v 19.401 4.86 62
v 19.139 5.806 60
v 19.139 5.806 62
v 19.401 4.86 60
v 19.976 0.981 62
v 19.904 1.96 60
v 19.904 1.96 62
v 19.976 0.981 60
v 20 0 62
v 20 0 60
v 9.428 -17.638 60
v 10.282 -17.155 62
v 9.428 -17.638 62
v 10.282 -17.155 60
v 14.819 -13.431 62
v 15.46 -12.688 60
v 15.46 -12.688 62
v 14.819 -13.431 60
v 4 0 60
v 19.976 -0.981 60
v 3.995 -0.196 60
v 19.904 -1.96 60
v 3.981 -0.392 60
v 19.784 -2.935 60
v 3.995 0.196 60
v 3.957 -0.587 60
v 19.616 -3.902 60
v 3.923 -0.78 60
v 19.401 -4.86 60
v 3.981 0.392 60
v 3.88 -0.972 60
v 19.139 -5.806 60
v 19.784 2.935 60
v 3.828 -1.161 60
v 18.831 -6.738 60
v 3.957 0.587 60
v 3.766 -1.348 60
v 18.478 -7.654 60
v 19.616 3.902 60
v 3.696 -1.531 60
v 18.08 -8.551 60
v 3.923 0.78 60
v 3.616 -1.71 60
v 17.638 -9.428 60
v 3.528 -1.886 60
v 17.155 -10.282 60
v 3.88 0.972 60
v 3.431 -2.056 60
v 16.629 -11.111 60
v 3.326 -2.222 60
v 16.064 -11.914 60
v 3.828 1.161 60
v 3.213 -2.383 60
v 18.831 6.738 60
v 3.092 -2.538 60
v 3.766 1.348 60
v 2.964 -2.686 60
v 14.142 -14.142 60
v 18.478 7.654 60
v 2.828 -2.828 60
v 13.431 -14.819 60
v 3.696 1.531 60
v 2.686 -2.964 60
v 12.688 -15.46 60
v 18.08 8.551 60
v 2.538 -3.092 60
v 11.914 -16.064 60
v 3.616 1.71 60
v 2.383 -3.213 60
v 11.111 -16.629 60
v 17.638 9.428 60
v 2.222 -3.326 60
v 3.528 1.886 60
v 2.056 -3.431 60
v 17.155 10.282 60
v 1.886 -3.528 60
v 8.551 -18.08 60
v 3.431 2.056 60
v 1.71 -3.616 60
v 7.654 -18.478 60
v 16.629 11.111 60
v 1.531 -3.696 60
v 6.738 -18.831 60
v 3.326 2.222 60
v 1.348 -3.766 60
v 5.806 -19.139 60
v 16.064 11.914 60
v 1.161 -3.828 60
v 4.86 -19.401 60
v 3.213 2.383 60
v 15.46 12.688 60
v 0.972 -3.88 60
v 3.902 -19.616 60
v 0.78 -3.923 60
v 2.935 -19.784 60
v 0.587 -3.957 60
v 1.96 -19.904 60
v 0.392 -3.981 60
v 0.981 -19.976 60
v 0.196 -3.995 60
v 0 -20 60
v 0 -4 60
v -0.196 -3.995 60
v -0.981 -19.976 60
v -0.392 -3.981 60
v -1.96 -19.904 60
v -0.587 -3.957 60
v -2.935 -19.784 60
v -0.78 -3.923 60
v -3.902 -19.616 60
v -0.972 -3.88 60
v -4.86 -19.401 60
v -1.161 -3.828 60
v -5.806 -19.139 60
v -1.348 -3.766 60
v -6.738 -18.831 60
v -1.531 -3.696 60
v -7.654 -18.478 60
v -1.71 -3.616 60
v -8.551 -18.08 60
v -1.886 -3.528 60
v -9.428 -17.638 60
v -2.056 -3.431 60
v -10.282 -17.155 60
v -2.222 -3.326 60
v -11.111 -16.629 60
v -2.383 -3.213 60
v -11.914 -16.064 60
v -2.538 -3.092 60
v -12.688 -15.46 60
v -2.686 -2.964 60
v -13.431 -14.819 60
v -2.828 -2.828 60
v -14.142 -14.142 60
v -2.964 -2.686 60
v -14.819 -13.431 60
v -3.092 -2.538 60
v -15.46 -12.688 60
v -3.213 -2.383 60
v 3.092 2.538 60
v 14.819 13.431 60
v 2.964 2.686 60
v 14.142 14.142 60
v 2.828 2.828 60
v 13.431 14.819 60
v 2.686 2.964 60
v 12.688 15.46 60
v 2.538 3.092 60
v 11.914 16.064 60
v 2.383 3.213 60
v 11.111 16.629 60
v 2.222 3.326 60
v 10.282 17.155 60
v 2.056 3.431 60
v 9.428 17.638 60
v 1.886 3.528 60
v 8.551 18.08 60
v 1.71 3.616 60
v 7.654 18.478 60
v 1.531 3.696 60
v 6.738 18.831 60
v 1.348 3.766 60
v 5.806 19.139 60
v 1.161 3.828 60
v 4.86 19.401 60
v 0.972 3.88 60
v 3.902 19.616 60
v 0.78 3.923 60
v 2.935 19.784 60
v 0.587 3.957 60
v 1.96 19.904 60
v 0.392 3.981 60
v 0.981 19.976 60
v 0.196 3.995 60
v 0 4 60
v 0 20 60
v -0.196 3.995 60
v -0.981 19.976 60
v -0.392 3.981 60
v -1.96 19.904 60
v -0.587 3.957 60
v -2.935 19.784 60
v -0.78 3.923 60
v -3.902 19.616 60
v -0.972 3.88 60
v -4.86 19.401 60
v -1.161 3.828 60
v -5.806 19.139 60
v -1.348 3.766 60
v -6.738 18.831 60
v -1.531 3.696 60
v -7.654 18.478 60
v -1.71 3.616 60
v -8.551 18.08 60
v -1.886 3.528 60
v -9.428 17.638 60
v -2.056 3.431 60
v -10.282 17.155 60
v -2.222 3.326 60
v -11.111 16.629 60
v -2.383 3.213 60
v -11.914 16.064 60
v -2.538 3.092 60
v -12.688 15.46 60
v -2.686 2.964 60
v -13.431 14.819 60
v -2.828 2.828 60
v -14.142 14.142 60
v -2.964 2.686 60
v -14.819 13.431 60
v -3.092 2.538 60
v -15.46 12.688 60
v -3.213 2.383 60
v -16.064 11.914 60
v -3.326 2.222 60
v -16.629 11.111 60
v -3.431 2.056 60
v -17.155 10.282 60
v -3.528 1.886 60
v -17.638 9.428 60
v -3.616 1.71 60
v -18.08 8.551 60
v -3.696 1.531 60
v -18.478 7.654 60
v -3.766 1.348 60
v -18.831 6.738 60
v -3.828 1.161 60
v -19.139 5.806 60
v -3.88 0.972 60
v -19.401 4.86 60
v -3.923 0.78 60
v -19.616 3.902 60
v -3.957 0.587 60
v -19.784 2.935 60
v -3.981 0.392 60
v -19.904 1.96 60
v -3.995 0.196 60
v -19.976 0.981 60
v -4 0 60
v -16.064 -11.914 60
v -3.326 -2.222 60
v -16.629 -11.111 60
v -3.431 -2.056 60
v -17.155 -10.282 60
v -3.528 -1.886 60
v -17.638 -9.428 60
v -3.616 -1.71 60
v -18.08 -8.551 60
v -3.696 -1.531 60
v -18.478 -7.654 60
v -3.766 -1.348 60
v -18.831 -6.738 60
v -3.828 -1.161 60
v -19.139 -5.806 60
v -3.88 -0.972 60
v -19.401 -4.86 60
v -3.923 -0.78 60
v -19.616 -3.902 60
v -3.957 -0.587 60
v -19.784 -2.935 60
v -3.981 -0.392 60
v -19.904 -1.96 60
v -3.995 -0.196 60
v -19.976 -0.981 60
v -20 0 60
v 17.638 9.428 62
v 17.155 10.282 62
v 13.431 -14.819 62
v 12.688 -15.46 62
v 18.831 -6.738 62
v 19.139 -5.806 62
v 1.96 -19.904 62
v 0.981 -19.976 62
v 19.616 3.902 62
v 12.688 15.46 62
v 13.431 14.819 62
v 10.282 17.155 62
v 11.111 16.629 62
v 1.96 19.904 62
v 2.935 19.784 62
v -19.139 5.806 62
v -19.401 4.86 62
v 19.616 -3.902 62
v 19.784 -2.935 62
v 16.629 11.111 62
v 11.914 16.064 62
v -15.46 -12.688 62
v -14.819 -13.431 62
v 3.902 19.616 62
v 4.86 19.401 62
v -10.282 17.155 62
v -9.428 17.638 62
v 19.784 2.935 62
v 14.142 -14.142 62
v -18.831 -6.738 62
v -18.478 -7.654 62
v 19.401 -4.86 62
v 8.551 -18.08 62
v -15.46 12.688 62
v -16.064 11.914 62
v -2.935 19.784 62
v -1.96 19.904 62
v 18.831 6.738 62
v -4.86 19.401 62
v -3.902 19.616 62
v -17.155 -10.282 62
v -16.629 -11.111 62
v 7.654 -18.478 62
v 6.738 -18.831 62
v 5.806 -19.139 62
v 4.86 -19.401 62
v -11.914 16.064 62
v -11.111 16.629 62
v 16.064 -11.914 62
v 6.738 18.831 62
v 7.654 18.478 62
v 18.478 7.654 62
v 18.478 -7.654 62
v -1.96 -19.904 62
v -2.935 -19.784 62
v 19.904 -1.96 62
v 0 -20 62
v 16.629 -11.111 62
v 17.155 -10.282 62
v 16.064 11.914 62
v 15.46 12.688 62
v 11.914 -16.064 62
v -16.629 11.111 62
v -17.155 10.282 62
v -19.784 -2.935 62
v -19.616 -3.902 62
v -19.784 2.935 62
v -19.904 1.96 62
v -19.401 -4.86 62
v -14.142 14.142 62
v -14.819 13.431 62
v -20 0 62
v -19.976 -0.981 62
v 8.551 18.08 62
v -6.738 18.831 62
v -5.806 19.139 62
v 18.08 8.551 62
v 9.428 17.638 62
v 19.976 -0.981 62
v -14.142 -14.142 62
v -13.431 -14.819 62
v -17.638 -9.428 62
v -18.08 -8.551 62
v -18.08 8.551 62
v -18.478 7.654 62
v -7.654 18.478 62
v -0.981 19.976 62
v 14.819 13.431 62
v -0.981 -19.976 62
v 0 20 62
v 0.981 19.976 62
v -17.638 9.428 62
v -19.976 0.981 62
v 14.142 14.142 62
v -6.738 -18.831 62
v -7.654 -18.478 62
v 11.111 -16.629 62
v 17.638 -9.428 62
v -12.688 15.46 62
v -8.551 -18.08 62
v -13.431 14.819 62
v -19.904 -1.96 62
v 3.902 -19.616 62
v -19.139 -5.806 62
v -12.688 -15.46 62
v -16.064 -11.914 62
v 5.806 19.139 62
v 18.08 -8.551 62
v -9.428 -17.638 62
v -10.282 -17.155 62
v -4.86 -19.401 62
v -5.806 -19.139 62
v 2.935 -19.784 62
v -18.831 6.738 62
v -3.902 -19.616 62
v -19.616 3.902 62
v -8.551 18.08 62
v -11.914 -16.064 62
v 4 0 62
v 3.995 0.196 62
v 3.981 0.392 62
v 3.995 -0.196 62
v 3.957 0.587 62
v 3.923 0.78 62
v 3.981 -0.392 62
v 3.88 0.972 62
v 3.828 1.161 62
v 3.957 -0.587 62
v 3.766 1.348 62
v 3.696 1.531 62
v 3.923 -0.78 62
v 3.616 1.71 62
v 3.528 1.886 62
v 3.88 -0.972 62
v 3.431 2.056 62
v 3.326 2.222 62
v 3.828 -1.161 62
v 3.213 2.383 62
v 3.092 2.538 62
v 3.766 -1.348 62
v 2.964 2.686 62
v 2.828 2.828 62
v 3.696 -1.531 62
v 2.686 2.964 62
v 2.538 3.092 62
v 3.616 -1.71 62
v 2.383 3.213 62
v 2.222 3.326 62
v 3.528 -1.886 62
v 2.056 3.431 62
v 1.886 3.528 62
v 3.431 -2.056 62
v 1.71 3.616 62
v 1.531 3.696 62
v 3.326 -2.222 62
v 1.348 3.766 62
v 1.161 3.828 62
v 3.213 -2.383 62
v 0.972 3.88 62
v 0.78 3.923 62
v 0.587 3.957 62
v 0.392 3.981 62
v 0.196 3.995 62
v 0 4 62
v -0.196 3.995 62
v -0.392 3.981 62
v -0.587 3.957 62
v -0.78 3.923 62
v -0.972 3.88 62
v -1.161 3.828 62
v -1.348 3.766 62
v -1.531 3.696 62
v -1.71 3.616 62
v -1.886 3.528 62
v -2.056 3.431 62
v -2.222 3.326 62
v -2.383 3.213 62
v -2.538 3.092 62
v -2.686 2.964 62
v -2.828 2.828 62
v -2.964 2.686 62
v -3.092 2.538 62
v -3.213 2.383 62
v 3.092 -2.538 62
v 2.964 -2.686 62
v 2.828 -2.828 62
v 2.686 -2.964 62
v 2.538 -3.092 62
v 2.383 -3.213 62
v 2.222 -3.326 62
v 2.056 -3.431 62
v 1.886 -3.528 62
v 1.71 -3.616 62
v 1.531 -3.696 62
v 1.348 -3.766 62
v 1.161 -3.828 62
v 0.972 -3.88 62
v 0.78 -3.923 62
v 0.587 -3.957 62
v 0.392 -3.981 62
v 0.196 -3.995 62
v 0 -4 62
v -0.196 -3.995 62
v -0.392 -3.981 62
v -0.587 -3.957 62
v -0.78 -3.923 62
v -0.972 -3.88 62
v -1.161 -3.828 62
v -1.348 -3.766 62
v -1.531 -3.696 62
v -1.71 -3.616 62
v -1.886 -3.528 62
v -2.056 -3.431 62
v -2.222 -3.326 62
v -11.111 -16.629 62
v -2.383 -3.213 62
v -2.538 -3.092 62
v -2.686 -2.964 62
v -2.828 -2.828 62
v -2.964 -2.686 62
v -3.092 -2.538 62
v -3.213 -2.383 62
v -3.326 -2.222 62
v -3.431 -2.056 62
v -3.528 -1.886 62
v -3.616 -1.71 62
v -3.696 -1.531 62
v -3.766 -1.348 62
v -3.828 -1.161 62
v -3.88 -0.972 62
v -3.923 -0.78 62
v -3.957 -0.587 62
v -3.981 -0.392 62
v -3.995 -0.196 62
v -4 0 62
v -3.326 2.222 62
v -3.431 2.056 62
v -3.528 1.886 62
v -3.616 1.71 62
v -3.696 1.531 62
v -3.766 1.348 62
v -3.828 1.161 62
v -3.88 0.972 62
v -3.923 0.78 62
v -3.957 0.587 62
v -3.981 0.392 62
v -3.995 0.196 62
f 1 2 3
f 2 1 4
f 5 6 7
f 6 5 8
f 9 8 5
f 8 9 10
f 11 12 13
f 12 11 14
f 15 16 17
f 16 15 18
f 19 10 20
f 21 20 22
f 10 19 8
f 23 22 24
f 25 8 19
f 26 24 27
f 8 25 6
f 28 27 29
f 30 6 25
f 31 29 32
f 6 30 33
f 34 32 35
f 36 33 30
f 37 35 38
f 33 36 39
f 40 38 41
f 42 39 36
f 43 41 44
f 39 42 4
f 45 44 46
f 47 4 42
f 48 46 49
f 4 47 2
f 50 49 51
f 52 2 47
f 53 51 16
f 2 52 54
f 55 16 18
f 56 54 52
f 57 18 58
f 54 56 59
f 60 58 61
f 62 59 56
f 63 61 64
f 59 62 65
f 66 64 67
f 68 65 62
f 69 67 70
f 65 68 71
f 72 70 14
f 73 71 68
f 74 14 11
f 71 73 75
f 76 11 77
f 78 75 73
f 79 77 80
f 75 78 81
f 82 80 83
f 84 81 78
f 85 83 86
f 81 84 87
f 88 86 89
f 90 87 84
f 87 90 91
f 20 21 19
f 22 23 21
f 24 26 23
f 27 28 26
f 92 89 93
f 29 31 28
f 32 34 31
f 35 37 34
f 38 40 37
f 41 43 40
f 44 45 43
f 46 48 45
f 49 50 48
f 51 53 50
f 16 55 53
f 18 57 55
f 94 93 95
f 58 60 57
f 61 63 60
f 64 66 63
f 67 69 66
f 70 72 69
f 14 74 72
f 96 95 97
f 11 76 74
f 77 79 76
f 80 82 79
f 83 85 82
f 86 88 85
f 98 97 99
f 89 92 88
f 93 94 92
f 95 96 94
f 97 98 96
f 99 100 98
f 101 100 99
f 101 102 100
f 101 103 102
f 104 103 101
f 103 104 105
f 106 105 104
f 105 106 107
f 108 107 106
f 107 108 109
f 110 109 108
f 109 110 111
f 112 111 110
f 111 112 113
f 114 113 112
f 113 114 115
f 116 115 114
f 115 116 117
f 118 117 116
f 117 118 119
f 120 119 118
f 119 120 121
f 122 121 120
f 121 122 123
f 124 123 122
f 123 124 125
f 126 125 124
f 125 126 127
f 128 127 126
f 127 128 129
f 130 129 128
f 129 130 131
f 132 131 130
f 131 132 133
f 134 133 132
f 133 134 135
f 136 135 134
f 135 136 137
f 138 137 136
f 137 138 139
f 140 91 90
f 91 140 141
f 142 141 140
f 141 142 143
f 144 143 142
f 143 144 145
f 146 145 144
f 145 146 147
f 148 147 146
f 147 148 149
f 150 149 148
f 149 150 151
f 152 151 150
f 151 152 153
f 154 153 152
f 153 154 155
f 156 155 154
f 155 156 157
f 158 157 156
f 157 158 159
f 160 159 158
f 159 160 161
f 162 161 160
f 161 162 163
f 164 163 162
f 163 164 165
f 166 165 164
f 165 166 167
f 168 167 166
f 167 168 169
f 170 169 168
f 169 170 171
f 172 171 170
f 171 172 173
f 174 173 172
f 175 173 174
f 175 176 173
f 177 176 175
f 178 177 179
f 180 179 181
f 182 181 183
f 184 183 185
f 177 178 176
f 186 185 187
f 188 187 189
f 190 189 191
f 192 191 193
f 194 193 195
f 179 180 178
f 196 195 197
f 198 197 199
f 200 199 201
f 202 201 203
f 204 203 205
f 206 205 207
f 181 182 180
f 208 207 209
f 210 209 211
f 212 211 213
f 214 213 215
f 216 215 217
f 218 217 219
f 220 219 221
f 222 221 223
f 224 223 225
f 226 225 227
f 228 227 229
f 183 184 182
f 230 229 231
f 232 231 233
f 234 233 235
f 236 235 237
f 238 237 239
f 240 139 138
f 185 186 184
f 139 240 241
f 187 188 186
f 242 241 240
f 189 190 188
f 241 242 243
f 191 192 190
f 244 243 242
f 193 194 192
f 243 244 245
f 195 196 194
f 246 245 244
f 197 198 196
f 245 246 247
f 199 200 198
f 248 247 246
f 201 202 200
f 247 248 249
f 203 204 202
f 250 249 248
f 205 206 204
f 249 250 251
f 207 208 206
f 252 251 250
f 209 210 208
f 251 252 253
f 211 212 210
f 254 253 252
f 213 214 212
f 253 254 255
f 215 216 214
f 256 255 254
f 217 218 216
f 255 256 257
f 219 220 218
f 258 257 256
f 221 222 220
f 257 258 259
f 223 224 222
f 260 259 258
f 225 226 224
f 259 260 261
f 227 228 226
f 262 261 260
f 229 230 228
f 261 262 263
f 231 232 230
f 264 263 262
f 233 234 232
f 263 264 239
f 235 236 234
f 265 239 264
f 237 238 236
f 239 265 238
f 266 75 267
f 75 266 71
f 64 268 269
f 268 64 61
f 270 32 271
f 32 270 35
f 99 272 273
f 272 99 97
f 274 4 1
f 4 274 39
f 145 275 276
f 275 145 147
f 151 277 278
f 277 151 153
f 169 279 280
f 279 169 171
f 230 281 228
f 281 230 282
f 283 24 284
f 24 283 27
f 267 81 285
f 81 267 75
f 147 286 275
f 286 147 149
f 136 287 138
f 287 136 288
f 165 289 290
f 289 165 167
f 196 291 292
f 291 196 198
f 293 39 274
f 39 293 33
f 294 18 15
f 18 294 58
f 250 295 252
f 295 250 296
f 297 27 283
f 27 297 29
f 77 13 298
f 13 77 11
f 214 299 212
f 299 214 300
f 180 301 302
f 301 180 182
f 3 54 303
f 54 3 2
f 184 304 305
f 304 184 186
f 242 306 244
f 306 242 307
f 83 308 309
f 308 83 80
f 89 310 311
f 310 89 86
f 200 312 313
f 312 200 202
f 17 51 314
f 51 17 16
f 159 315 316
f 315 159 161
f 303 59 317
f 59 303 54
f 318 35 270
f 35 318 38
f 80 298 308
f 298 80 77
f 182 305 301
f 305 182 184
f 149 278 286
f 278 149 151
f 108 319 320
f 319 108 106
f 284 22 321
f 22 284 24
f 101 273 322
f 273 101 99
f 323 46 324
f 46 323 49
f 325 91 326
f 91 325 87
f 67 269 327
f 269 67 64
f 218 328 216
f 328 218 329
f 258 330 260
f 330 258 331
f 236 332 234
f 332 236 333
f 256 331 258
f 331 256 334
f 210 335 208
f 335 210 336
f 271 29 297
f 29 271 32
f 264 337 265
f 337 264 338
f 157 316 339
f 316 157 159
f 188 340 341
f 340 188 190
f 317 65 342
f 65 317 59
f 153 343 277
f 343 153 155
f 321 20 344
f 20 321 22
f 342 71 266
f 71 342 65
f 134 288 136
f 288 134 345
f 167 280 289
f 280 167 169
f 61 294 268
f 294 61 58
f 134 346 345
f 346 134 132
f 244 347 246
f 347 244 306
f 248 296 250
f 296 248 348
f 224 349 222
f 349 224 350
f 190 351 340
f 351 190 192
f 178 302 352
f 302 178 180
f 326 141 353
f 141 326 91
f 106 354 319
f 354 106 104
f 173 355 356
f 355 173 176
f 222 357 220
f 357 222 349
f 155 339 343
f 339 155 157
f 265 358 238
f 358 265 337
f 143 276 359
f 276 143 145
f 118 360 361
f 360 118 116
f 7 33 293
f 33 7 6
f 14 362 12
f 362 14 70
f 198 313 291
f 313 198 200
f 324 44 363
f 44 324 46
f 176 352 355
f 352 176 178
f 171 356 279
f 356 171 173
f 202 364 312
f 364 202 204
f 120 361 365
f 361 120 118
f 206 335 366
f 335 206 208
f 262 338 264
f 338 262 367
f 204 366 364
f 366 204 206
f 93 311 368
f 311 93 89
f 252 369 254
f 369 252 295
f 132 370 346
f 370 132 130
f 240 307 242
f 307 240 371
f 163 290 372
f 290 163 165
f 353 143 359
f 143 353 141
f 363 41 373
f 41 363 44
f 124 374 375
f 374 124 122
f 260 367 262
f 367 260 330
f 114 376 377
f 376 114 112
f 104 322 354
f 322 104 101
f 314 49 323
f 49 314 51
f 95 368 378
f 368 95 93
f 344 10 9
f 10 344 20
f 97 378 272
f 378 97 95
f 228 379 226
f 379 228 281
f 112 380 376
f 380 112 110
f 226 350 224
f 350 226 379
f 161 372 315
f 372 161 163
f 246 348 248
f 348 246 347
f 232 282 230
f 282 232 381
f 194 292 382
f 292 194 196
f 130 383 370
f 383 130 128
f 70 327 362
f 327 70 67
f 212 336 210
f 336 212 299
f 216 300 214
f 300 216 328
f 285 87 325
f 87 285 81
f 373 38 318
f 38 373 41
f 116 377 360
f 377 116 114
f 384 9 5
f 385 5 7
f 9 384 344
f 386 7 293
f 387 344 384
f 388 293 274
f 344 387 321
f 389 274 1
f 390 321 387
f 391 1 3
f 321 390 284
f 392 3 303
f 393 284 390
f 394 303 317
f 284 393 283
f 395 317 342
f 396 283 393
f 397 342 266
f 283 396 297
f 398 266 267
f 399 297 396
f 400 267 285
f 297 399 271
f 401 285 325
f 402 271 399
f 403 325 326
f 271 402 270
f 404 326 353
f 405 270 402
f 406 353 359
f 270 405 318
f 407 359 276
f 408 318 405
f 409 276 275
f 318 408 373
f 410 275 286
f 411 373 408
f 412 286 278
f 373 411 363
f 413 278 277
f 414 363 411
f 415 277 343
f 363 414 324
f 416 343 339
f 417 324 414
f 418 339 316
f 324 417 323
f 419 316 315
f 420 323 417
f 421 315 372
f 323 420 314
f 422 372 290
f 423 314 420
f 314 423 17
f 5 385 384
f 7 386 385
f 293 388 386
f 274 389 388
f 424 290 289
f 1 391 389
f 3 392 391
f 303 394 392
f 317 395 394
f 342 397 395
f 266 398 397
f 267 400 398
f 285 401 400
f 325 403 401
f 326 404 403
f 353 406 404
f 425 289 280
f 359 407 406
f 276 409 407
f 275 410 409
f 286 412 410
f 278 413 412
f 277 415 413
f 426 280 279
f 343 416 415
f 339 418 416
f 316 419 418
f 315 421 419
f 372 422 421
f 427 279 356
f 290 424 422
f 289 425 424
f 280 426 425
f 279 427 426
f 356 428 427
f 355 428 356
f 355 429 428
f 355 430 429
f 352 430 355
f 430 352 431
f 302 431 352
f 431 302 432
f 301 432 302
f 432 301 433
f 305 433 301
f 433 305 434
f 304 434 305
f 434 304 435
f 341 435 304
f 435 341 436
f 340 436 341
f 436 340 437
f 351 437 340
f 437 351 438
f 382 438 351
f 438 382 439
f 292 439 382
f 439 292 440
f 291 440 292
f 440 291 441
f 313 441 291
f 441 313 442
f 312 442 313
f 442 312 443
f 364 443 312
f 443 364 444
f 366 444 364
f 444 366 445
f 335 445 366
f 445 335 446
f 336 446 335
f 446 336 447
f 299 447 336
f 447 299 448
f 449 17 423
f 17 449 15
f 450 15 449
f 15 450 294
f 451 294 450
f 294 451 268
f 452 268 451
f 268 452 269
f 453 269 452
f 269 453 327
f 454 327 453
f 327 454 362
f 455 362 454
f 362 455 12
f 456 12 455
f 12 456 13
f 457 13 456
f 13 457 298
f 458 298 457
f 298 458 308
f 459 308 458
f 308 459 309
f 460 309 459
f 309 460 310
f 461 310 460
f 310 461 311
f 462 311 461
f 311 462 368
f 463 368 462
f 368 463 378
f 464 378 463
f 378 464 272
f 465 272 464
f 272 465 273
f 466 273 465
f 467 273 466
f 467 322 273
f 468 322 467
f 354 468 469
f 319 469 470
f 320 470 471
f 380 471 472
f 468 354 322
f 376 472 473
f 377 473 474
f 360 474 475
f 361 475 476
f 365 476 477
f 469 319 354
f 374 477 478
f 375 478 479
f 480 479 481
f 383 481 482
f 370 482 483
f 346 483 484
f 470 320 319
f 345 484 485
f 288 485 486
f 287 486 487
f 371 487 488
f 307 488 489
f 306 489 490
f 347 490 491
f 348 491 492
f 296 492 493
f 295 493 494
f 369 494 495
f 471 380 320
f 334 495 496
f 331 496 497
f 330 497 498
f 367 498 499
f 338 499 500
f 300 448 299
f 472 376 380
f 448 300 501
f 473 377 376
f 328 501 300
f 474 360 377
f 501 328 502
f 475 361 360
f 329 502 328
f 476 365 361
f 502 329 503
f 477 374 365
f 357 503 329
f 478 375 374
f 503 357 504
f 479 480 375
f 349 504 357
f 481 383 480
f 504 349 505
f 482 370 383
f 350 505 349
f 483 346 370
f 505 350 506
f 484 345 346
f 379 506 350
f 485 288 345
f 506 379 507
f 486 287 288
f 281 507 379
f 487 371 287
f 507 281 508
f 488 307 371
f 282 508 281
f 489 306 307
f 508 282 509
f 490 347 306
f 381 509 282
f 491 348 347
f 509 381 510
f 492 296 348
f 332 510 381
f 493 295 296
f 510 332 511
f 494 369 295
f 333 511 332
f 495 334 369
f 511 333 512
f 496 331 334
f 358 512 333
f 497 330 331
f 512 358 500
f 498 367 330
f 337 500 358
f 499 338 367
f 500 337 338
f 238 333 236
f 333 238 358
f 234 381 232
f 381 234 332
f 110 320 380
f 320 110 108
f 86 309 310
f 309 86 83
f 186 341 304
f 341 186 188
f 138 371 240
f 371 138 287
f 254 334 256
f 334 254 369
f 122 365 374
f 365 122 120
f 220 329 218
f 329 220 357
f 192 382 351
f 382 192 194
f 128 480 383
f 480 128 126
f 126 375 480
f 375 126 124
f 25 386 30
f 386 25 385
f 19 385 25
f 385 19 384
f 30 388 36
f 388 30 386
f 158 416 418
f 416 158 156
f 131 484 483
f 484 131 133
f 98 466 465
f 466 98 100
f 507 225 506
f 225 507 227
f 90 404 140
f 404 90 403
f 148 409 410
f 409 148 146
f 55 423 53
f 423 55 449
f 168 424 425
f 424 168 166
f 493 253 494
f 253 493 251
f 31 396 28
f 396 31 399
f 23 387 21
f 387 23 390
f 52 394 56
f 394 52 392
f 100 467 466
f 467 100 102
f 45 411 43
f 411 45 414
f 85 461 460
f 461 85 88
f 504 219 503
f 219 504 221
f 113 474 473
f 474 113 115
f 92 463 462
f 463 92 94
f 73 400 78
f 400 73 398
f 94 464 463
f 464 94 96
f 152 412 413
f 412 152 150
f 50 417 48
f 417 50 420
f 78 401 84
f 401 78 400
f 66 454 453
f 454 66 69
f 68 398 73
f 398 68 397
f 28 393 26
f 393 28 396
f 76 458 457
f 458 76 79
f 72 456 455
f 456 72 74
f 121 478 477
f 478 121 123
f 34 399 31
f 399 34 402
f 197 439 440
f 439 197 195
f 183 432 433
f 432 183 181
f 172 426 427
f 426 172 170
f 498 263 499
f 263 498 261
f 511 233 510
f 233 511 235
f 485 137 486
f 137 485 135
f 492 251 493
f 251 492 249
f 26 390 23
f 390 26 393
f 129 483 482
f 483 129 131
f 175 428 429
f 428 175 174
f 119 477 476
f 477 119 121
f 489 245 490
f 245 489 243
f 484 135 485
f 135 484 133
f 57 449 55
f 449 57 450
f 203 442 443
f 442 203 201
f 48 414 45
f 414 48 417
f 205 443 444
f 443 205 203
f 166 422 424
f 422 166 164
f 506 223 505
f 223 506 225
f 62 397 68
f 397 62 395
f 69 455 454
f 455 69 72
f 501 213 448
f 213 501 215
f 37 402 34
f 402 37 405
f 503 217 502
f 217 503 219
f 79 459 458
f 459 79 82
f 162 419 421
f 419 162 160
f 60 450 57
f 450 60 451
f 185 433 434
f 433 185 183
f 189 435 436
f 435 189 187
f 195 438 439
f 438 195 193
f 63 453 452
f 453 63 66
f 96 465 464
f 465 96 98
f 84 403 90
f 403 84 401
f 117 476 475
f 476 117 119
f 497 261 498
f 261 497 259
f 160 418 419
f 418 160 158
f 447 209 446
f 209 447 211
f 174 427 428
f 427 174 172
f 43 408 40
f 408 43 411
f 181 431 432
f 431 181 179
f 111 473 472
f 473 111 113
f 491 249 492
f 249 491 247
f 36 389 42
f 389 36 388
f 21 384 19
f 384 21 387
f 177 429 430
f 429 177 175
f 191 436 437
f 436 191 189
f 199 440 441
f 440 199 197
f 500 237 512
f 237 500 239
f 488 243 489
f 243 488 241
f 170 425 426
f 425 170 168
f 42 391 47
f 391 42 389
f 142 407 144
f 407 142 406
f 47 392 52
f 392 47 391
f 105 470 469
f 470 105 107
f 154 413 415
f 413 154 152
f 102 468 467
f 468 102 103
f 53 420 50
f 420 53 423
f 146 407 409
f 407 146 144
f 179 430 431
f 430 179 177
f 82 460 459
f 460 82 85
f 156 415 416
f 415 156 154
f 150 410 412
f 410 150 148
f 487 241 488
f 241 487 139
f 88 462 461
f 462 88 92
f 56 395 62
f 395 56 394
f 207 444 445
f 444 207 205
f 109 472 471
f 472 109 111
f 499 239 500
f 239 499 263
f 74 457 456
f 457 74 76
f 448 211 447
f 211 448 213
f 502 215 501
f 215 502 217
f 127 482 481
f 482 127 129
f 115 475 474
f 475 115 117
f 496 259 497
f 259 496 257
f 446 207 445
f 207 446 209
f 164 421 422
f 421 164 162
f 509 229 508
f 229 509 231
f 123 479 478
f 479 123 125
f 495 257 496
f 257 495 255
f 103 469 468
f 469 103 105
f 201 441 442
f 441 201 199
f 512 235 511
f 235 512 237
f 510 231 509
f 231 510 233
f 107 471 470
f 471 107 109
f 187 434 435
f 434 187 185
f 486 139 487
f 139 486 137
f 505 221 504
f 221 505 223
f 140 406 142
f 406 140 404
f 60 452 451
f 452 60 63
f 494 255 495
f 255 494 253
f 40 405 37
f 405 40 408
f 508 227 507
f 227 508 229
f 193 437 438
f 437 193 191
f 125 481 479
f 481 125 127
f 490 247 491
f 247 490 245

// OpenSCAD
// file: common_params.scad
cylinder_radius = 20.000000;
cylinder_height = 60.000000;
wall_thickness = 2.000000;

cap_thickness = 2.000000;

rod_radius = 2.000000;
rod_height = 50.000000;

ring_outer_radius = 8.000000;
ring_inner_radius = 4.000000;
ring_thickness = 3.000000;
ring_z = 40.000000;

$fn = 128;
// main file
include <common_params.scad>;

hole_radius = 4.000000;

translate([0, 0, cylinder_height])
difference() {
    cylinder(h = cap_thickness, r = cylinder_radius);
    translate([0, 0, -0.1])
        cylinder(h = cap_thickness + 0.2, r = hole_radius);
}
